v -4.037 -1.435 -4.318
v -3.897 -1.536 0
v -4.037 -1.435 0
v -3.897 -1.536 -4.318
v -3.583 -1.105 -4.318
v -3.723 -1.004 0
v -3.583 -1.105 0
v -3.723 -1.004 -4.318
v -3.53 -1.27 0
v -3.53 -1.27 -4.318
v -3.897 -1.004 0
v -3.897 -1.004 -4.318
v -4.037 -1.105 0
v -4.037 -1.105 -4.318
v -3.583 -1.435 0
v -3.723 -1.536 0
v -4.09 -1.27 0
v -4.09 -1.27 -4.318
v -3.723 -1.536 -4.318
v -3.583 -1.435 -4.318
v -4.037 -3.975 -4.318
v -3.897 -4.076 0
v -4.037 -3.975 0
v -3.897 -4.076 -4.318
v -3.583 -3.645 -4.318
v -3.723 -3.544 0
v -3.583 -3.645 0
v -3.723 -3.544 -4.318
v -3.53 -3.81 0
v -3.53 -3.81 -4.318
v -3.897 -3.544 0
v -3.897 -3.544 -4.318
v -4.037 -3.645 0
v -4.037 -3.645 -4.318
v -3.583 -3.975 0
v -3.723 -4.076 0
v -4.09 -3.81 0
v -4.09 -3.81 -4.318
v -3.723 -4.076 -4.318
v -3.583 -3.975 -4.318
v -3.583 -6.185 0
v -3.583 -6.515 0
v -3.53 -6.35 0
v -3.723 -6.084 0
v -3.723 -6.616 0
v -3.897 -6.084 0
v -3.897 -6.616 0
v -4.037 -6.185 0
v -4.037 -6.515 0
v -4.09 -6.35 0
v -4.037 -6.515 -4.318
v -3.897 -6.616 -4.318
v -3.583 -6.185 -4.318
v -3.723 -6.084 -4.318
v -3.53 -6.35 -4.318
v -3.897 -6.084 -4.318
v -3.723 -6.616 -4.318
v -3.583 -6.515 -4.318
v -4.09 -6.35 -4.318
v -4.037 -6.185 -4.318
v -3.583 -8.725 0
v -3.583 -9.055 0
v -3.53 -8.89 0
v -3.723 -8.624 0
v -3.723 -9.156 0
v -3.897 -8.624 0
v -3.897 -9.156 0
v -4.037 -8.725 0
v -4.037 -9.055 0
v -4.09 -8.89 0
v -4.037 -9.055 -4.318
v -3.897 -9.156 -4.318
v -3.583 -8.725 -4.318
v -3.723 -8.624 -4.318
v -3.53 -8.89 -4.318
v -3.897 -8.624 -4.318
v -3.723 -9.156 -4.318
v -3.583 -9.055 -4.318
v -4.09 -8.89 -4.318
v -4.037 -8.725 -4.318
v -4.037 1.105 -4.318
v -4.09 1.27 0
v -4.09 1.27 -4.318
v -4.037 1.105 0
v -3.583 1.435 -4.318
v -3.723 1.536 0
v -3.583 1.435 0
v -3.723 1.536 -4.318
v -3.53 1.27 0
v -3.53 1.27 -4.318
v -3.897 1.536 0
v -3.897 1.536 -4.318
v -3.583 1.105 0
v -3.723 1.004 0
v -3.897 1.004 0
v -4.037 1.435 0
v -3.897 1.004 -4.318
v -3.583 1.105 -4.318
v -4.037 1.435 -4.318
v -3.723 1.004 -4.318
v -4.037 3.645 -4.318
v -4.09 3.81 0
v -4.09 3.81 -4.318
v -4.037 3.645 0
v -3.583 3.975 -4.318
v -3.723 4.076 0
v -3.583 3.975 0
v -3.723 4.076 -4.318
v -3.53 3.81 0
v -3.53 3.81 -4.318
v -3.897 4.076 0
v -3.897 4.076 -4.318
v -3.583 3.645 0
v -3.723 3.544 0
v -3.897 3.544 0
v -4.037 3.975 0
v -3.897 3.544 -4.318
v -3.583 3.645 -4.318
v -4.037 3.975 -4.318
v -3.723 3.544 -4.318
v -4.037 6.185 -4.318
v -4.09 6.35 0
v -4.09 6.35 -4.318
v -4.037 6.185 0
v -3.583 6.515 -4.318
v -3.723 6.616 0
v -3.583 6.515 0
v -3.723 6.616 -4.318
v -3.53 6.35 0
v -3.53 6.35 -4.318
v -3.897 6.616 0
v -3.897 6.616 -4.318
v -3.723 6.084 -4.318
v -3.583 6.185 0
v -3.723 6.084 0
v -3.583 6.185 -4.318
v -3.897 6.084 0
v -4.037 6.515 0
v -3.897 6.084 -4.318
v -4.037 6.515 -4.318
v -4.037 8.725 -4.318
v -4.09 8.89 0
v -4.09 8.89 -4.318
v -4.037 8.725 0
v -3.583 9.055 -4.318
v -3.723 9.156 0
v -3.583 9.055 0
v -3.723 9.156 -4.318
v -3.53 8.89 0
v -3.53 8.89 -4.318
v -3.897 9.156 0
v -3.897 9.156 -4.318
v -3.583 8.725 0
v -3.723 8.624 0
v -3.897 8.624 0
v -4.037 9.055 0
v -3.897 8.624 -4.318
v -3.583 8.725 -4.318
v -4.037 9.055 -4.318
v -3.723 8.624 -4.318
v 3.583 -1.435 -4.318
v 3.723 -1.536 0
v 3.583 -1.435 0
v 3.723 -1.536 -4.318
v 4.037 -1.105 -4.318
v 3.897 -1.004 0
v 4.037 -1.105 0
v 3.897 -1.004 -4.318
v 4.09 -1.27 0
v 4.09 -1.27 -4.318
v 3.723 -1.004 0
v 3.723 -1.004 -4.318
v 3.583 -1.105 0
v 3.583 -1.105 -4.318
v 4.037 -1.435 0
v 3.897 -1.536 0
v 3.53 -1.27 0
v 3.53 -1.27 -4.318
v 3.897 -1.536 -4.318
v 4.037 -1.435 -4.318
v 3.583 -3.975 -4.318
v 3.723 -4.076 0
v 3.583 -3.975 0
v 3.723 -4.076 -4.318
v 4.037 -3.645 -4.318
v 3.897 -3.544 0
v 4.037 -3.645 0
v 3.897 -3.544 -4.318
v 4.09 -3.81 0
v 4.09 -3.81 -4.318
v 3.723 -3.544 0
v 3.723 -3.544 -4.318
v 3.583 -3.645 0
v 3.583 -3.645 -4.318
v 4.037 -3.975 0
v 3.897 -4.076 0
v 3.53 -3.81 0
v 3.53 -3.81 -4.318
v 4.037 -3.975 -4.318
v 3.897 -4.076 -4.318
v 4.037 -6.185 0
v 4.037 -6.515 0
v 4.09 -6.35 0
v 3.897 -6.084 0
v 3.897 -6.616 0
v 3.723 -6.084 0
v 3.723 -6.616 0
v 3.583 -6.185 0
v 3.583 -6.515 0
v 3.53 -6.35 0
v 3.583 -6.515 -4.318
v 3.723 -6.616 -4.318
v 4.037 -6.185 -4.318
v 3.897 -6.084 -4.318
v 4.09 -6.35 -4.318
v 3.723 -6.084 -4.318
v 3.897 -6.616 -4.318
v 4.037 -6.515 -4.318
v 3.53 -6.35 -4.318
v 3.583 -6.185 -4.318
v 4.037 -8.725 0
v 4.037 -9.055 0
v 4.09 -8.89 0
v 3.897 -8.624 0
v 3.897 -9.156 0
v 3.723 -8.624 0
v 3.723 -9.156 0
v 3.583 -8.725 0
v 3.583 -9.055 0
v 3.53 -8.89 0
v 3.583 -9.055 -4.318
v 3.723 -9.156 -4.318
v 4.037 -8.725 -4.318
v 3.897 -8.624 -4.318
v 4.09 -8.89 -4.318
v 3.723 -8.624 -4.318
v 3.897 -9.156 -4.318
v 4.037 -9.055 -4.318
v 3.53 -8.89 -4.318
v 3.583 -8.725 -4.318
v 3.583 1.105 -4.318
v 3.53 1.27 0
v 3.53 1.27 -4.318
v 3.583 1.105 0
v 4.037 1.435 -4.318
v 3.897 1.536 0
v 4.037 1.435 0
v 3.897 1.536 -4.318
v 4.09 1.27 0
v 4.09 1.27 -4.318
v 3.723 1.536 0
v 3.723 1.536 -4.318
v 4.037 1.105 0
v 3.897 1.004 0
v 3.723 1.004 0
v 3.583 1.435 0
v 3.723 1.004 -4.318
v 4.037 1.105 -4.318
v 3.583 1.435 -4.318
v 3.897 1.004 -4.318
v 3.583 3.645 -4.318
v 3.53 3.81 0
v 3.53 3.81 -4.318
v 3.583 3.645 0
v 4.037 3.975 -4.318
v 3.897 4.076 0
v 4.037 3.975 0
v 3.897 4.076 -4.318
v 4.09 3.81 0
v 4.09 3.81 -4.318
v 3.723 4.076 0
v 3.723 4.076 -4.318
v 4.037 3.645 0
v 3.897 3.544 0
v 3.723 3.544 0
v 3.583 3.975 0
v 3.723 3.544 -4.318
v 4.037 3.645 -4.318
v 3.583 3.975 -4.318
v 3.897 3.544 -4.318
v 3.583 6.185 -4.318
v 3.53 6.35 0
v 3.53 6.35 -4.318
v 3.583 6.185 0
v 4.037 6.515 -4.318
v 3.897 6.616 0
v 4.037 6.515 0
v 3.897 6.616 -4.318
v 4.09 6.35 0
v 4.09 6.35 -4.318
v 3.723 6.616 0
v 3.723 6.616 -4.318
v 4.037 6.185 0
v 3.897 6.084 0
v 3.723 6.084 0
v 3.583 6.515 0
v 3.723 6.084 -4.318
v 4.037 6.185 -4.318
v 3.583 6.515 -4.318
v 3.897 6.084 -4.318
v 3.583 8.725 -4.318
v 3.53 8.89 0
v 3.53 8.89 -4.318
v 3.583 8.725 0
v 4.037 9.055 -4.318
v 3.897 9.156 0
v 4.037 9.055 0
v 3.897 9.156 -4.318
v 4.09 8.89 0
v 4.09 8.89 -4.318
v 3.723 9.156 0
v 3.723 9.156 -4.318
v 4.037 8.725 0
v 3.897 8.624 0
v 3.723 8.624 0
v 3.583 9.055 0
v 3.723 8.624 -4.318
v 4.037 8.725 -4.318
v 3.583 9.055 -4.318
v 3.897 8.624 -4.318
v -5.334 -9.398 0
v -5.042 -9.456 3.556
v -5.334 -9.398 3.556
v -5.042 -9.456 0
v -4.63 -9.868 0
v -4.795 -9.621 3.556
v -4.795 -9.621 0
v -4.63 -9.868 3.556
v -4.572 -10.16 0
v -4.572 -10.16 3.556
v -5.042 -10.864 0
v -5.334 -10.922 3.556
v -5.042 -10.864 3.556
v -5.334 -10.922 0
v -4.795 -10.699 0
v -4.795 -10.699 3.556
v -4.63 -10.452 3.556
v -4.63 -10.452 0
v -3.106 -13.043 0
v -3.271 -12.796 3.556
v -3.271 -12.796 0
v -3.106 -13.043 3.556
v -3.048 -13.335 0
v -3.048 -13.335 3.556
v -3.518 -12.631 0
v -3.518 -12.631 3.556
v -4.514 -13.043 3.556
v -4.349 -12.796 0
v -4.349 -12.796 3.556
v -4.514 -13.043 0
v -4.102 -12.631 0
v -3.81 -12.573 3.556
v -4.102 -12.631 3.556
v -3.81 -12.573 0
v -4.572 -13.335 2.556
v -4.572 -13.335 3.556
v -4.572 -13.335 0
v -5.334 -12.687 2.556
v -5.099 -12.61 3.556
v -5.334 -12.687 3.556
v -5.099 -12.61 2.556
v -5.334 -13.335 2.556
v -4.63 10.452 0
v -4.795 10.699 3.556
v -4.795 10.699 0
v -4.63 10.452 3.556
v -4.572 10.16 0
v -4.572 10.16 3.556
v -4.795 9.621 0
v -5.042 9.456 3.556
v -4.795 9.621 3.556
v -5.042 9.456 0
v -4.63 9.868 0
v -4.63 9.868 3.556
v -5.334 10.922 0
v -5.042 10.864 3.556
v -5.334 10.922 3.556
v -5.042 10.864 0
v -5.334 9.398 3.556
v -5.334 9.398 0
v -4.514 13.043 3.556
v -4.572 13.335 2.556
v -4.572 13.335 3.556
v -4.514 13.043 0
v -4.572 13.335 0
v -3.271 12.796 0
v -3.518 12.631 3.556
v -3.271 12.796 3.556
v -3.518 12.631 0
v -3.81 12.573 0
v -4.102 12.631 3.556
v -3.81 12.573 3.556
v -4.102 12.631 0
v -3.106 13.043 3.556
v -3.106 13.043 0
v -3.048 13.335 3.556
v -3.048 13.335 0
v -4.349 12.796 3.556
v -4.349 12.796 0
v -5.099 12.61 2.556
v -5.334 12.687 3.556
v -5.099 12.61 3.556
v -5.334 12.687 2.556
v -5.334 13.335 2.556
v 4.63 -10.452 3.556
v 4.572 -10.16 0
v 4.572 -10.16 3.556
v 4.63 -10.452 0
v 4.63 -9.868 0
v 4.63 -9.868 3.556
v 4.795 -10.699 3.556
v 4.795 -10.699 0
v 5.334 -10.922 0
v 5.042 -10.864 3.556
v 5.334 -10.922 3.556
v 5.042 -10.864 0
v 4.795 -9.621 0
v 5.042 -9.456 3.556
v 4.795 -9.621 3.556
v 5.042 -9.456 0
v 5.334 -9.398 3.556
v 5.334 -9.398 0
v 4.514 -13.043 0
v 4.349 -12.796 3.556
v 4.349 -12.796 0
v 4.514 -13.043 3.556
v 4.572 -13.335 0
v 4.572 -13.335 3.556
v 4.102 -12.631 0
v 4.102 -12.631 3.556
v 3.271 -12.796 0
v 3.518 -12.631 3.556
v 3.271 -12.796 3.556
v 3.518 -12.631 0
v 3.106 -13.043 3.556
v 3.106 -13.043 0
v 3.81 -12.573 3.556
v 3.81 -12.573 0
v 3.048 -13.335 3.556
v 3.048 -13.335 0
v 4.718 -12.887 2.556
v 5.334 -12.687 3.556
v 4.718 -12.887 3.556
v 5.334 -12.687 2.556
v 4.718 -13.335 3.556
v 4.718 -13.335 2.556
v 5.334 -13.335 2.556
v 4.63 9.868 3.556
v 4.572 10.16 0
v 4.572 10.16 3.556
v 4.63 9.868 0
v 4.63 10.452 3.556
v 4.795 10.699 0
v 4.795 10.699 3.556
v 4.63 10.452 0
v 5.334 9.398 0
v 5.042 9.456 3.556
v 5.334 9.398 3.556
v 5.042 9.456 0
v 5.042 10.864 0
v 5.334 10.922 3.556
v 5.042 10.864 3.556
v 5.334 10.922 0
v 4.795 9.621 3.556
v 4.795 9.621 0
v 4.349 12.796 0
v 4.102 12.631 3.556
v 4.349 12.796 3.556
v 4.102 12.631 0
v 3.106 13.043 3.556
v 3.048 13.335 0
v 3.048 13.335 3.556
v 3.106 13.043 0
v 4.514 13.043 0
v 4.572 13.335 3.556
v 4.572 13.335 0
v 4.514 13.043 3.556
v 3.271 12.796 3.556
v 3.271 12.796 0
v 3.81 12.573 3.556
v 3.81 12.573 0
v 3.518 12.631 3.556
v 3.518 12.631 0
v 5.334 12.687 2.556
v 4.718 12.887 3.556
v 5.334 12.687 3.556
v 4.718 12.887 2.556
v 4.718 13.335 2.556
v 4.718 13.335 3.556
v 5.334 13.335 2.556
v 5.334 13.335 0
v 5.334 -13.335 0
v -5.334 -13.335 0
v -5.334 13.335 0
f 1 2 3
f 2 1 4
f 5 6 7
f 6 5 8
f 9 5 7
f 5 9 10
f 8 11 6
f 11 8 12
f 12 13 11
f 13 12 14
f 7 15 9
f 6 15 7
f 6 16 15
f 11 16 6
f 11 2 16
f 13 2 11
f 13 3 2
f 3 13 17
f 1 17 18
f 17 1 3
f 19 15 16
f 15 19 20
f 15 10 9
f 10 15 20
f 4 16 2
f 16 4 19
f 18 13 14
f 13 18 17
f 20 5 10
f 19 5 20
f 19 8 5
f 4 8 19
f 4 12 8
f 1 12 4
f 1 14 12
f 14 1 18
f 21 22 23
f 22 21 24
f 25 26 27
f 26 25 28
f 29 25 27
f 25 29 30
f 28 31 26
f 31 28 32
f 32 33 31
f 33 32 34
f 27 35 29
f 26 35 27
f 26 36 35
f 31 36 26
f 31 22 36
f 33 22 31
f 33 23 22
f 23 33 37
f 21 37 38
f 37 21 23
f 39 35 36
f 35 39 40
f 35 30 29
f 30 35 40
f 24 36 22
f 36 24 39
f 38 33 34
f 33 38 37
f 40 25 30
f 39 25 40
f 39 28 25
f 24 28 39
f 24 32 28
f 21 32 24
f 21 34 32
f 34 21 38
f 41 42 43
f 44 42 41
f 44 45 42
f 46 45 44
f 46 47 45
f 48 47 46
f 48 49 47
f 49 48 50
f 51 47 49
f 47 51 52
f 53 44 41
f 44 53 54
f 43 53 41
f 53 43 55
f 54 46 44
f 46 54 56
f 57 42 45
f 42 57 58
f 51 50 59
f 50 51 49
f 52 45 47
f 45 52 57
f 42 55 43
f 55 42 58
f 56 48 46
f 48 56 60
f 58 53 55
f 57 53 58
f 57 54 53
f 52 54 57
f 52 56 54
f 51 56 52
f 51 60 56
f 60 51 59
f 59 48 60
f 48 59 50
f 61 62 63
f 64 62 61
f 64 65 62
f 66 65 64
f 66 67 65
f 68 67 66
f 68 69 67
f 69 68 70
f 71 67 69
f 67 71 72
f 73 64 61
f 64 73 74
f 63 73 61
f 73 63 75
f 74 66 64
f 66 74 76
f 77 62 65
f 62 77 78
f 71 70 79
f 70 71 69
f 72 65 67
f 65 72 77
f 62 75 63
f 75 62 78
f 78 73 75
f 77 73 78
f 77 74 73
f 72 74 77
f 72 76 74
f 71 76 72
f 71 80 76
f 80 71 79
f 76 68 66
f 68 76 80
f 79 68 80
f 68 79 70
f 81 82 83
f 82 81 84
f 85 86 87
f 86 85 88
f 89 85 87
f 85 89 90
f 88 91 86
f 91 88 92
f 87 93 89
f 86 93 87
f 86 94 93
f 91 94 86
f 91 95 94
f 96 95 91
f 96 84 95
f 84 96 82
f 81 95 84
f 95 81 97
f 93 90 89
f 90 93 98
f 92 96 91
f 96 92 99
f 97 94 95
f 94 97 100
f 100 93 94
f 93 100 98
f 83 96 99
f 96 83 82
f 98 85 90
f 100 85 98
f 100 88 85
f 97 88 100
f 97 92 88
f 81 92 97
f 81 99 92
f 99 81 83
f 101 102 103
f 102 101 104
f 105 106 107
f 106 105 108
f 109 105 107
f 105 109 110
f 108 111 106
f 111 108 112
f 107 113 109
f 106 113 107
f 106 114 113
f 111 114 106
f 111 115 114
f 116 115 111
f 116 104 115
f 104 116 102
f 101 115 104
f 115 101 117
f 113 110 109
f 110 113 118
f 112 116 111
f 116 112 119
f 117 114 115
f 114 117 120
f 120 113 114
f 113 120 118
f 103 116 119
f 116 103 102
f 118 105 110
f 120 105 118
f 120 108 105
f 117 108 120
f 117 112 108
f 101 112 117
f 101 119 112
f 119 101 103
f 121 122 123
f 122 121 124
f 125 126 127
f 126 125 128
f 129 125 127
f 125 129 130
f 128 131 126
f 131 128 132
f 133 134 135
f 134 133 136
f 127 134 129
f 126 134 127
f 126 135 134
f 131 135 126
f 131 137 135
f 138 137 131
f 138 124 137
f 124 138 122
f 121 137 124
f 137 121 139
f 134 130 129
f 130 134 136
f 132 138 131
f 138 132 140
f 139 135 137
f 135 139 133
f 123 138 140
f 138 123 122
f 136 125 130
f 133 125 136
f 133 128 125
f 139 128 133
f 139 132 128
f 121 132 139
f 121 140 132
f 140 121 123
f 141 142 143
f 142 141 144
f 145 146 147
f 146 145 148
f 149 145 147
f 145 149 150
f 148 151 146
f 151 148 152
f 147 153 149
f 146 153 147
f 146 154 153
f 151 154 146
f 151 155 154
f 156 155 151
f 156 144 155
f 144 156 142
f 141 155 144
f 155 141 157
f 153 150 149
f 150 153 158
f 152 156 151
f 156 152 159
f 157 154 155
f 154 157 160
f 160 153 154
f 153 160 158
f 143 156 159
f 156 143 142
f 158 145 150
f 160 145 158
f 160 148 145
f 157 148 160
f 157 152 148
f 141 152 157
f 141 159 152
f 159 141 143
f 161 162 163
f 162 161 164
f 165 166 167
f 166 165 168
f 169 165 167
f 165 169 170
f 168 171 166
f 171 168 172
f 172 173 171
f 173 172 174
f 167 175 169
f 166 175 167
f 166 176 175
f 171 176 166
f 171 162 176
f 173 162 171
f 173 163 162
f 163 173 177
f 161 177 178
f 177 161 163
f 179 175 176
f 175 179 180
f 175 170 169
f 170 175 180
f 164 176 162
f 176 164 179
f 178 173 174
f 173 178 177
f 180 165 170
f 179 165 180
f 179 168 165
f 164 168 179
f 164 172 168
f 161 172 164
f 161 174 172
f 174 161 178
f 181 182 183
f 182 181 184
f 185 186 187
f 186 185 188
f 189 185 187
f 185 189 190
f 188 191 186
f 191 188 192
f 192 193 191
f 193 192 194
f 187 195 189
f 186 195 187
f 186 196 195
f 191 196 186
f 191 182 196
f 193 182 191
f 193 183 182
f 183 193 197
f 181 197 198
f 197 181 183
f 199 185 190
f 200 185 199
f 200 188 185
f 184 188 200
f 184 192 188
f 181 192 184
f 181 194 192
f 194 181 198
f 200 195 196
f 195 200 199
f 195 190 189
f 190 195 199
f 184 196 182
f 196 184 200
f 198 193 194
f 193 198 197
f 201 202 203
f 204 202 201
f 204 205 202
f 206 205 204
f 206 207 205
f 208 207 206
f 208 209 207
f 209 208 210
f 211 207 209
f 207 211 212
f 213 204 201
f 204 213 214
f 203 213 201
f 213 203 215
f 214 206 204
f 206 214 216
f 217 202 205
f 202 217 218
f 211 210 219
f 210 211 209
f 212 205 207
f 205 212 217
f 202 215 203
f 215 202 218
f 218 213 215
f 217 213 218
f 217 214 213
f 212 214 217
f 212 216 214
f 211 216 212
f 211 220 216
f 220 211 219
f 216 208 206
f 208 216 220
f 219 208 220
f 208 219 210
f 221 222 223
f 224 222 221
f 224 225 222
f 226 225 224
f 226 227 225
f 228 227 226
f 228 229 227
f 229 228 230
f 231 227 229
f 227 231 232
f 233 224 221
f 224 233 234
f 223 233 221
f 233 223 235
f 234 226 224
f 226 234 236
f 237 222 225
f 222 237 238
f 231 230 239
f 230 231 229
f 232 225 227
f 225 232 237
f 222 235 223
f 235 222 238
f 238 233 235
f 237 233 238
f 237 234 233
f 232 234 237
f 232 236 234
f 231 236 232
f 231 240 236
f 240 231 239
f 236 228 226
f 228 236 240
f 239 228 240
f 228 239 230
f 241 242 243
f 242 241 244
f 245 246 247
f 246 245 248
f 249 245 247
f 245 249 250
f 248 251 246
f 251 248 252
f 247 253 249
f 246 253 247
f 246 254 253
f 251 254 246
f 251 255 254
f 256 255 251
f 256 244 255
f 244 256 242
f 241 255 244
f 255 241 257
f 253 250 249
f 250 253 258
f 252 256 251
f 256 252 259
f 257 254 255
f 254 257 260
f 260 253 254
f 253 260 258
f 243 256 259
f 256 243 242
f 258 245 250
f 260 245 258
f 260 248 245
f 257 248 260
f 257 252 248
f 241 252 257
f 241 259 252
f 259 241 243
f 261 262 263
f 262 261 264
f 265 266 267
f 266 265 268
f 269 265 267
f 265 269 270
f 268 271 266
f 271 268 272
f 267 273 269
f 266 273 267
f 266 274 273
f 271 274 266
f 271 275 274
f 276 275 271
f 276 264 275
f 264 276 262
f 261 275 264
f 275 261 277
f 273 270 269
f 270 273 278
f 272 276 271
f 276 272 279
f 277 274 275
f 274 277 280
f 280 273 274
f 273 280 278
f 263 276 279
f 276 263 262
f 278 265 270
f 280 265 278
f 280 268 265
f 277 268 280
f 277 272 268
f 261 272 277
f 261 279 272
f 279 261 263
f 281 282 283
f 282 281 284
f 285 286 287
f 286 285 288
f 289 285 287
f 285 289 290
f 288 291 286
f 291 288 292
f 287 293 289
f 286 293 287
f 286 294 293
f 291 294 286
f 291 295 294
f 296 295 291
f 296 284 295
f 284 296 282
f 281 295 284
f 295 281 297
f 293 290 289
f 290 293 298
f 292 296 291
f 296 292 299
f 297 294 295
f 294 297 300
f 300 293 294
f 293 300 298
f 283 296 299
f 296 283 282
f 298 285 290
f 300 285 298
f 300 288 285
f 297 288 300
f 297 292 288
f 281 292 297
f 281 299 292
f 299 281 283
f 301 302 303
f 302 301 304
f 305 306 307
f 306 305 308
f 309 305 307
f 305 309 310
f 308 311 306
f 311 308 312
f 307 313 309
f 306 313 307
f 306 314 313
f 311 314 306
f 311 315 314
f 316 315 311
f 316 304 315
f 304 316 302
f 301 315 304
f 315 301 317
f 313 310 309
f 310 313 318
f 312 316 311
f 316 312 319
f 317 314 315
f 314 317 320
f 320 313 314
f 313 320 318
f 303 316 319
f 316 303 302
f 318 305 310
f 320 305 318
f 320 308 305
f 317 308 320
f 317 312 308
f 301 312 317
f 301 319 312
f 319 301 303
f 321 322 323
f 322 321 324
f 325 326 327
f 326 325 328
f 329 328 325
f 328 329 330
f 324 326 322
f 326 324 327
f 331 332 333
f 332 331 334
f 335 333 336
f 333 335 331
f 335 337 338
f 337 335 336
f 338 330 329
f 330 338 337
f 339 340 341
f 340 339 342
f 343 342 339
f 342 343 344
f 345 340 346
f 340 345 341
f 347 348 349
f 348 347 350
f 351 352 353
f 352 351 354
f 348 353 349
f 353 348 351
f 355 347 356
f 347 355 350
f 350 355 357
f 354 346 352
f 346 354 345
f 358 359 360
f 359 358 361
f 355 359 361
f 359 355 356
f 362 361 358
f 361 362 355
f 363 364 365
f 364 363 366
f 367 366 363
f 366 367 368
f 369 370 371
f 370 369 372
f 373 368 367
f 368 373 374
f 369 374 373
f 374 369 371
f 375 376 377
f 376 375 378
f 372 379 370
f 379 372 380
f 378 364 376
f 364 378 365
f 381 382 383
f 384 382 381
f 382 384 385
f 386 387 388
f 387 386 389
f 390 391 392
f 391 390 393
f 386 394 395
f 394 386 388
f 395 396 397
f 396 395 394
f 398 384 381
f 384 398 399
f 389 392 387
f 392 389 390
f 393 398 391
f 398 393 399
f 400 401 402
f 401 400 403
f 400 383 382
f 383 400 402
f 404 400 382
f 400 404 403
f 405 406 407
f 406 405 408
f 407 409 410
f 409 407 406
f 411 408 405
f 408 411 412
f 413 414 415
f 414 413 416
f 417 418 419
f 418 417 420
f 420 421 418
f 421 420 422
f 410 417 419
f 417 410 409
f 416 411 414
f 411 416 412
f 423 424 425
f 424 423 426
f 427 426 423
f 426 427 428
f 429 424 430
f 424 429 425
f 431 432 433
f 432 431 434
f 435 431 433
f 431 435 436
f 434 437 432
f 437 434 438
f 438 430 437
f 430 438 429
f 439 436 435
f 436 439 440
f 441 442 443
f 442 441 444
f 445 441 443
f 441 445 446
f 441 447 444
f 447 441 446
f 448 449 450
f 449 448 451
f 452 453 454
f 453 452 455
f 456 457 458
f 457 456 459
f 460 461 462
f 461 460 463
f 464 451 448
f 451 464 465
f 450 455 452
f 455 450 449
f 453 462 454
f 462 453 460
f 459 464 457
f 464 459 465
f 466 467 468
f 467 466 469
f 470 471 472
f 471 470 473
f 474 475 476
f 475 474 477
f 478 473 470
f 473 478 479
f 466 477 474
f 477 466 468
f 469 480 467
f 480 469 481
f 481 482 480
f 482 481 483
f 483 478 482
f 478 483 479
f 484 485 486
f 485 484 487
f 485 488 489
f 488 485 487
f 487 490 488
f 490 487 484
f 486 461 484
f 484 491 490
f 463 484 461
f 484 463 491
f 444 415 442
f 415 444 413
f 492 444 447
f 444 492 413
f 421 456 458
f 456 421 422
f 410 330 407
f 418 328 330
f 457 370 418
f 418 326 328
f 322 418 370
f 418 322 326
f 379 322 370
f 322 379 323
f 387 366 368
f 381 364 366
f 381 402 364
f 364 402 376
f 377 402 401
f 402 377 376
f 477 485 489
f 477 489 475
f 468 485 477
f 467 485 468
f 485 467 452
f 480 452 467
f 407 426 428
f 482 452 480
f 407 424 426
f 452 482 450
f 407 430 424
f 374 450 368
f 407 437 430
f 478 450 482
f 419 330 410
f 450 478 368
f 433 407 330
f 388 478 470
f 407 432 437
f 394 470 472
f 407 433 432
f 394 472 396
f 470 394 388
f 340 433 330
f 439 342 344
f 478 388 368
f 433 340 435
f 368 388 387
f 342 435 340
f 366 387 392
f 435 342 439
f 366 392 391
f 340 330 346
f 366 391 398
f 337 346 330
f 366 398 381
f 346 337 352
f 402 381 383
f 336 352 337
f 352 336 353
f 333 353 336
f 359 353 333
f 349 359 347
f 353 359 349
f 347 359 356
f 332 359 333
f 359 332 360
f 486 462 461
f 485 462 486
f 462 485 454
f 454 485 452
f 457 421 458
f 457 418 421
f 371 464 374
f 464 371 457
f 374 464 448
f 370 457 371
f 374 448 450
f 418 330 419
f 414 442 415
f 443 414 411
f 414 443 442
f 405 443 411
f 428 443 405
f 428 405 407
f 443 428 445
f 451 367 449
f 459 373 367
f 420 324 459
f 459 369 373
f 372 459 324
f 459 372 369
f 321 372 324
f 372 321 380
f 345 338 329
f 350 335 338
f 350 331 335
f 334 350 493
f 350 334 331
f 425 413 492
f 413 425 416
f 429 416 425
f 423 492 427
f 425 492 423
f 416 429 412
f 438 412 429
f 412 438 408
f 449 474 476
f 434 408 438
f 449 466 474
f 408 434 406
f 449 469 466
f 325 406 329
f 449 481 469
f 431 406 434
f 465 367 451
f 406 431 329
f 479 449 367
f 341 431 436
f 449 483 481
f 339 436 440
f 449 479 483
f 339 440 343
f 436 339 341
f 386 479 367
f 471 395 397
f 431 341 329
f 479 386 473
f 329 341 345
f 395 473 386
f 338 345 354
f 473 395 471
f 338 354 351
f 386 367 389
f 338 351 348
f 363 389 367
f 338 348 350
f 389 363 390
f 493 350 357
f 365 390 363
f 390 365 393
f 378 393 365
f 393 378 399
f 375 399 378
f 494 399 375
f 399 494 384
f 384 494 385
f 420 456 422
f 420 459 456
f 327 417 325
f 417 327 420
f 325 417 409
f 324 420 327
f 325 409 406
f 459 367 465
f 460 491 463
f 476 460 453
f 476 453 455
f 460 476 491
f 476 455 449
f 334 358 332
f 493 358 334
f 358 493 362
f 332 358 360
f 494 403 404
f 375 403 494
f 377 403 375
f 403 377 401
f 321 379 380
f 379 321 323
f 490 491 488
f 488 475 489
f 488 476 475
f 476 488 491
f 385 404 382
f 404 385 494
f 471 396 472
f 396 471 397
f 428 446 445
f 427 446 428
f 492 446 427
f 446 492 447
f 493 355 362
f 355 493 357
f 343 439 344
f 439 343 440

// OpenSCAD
module til308() {
  assign(w = 0.42)
  assign(h = 1.05)
  assign(d = 0.14)
  assign(pin_w = 0.3)
  assign(pin_h = 0.17)
  assign(notch_r = (w - pin_w) / 4) {
    color("silver")
    for (x=[-1,1], ysign=[-1,1], y=[0:3]) {
      translate([x * 0.3 / 2 * 25.4, ysign * (y * 0.1 + 0.05) * 25.4, -0.17 / 2 * 25.4]) 
      cylinder(r=0.56/2, h=0.17*25.4, center=true, $fn=10);
    }

    color("black")
    translate([0, 0.25 * 25.4, 2]) 
    cube(size=[4.2, 6.4, 1], center=true);

    color("black")
    translate([0, -.15 * 25.4, 2]) 
    cube(size=[2, 2, 1], center=true);

    color("red", 0.6)
    translate([0, 0, d / 2 * 25.4]) 
    difference() {
      cube(size=[w * 25.4, h * 25.4, d * 25.4], center=true);
      for (x=[-1,1], y=[-1,1]) {
        translate([x * w / 2 * 25.4, y * (4 * 0.1 * 25.4), 0])
          cylinder(r=notch_r * 25.4, h=10, center=true, $fn=16); 

        translate([x * (w / 2 - notch_r * 2) * 25.4, y * (h / 2) * 25.4, 0])
          cylinder(r=notch_r * 25.4, h=10, center=true, $fn=16);

        translate([x * w / 2 * 25.4, y * h / 2 * 25.4, d / 2 * 25.4]) 
          cylinder(r=notch_r * 25.4, h=2, center=true);
      }
    }
  }
}

til308();
